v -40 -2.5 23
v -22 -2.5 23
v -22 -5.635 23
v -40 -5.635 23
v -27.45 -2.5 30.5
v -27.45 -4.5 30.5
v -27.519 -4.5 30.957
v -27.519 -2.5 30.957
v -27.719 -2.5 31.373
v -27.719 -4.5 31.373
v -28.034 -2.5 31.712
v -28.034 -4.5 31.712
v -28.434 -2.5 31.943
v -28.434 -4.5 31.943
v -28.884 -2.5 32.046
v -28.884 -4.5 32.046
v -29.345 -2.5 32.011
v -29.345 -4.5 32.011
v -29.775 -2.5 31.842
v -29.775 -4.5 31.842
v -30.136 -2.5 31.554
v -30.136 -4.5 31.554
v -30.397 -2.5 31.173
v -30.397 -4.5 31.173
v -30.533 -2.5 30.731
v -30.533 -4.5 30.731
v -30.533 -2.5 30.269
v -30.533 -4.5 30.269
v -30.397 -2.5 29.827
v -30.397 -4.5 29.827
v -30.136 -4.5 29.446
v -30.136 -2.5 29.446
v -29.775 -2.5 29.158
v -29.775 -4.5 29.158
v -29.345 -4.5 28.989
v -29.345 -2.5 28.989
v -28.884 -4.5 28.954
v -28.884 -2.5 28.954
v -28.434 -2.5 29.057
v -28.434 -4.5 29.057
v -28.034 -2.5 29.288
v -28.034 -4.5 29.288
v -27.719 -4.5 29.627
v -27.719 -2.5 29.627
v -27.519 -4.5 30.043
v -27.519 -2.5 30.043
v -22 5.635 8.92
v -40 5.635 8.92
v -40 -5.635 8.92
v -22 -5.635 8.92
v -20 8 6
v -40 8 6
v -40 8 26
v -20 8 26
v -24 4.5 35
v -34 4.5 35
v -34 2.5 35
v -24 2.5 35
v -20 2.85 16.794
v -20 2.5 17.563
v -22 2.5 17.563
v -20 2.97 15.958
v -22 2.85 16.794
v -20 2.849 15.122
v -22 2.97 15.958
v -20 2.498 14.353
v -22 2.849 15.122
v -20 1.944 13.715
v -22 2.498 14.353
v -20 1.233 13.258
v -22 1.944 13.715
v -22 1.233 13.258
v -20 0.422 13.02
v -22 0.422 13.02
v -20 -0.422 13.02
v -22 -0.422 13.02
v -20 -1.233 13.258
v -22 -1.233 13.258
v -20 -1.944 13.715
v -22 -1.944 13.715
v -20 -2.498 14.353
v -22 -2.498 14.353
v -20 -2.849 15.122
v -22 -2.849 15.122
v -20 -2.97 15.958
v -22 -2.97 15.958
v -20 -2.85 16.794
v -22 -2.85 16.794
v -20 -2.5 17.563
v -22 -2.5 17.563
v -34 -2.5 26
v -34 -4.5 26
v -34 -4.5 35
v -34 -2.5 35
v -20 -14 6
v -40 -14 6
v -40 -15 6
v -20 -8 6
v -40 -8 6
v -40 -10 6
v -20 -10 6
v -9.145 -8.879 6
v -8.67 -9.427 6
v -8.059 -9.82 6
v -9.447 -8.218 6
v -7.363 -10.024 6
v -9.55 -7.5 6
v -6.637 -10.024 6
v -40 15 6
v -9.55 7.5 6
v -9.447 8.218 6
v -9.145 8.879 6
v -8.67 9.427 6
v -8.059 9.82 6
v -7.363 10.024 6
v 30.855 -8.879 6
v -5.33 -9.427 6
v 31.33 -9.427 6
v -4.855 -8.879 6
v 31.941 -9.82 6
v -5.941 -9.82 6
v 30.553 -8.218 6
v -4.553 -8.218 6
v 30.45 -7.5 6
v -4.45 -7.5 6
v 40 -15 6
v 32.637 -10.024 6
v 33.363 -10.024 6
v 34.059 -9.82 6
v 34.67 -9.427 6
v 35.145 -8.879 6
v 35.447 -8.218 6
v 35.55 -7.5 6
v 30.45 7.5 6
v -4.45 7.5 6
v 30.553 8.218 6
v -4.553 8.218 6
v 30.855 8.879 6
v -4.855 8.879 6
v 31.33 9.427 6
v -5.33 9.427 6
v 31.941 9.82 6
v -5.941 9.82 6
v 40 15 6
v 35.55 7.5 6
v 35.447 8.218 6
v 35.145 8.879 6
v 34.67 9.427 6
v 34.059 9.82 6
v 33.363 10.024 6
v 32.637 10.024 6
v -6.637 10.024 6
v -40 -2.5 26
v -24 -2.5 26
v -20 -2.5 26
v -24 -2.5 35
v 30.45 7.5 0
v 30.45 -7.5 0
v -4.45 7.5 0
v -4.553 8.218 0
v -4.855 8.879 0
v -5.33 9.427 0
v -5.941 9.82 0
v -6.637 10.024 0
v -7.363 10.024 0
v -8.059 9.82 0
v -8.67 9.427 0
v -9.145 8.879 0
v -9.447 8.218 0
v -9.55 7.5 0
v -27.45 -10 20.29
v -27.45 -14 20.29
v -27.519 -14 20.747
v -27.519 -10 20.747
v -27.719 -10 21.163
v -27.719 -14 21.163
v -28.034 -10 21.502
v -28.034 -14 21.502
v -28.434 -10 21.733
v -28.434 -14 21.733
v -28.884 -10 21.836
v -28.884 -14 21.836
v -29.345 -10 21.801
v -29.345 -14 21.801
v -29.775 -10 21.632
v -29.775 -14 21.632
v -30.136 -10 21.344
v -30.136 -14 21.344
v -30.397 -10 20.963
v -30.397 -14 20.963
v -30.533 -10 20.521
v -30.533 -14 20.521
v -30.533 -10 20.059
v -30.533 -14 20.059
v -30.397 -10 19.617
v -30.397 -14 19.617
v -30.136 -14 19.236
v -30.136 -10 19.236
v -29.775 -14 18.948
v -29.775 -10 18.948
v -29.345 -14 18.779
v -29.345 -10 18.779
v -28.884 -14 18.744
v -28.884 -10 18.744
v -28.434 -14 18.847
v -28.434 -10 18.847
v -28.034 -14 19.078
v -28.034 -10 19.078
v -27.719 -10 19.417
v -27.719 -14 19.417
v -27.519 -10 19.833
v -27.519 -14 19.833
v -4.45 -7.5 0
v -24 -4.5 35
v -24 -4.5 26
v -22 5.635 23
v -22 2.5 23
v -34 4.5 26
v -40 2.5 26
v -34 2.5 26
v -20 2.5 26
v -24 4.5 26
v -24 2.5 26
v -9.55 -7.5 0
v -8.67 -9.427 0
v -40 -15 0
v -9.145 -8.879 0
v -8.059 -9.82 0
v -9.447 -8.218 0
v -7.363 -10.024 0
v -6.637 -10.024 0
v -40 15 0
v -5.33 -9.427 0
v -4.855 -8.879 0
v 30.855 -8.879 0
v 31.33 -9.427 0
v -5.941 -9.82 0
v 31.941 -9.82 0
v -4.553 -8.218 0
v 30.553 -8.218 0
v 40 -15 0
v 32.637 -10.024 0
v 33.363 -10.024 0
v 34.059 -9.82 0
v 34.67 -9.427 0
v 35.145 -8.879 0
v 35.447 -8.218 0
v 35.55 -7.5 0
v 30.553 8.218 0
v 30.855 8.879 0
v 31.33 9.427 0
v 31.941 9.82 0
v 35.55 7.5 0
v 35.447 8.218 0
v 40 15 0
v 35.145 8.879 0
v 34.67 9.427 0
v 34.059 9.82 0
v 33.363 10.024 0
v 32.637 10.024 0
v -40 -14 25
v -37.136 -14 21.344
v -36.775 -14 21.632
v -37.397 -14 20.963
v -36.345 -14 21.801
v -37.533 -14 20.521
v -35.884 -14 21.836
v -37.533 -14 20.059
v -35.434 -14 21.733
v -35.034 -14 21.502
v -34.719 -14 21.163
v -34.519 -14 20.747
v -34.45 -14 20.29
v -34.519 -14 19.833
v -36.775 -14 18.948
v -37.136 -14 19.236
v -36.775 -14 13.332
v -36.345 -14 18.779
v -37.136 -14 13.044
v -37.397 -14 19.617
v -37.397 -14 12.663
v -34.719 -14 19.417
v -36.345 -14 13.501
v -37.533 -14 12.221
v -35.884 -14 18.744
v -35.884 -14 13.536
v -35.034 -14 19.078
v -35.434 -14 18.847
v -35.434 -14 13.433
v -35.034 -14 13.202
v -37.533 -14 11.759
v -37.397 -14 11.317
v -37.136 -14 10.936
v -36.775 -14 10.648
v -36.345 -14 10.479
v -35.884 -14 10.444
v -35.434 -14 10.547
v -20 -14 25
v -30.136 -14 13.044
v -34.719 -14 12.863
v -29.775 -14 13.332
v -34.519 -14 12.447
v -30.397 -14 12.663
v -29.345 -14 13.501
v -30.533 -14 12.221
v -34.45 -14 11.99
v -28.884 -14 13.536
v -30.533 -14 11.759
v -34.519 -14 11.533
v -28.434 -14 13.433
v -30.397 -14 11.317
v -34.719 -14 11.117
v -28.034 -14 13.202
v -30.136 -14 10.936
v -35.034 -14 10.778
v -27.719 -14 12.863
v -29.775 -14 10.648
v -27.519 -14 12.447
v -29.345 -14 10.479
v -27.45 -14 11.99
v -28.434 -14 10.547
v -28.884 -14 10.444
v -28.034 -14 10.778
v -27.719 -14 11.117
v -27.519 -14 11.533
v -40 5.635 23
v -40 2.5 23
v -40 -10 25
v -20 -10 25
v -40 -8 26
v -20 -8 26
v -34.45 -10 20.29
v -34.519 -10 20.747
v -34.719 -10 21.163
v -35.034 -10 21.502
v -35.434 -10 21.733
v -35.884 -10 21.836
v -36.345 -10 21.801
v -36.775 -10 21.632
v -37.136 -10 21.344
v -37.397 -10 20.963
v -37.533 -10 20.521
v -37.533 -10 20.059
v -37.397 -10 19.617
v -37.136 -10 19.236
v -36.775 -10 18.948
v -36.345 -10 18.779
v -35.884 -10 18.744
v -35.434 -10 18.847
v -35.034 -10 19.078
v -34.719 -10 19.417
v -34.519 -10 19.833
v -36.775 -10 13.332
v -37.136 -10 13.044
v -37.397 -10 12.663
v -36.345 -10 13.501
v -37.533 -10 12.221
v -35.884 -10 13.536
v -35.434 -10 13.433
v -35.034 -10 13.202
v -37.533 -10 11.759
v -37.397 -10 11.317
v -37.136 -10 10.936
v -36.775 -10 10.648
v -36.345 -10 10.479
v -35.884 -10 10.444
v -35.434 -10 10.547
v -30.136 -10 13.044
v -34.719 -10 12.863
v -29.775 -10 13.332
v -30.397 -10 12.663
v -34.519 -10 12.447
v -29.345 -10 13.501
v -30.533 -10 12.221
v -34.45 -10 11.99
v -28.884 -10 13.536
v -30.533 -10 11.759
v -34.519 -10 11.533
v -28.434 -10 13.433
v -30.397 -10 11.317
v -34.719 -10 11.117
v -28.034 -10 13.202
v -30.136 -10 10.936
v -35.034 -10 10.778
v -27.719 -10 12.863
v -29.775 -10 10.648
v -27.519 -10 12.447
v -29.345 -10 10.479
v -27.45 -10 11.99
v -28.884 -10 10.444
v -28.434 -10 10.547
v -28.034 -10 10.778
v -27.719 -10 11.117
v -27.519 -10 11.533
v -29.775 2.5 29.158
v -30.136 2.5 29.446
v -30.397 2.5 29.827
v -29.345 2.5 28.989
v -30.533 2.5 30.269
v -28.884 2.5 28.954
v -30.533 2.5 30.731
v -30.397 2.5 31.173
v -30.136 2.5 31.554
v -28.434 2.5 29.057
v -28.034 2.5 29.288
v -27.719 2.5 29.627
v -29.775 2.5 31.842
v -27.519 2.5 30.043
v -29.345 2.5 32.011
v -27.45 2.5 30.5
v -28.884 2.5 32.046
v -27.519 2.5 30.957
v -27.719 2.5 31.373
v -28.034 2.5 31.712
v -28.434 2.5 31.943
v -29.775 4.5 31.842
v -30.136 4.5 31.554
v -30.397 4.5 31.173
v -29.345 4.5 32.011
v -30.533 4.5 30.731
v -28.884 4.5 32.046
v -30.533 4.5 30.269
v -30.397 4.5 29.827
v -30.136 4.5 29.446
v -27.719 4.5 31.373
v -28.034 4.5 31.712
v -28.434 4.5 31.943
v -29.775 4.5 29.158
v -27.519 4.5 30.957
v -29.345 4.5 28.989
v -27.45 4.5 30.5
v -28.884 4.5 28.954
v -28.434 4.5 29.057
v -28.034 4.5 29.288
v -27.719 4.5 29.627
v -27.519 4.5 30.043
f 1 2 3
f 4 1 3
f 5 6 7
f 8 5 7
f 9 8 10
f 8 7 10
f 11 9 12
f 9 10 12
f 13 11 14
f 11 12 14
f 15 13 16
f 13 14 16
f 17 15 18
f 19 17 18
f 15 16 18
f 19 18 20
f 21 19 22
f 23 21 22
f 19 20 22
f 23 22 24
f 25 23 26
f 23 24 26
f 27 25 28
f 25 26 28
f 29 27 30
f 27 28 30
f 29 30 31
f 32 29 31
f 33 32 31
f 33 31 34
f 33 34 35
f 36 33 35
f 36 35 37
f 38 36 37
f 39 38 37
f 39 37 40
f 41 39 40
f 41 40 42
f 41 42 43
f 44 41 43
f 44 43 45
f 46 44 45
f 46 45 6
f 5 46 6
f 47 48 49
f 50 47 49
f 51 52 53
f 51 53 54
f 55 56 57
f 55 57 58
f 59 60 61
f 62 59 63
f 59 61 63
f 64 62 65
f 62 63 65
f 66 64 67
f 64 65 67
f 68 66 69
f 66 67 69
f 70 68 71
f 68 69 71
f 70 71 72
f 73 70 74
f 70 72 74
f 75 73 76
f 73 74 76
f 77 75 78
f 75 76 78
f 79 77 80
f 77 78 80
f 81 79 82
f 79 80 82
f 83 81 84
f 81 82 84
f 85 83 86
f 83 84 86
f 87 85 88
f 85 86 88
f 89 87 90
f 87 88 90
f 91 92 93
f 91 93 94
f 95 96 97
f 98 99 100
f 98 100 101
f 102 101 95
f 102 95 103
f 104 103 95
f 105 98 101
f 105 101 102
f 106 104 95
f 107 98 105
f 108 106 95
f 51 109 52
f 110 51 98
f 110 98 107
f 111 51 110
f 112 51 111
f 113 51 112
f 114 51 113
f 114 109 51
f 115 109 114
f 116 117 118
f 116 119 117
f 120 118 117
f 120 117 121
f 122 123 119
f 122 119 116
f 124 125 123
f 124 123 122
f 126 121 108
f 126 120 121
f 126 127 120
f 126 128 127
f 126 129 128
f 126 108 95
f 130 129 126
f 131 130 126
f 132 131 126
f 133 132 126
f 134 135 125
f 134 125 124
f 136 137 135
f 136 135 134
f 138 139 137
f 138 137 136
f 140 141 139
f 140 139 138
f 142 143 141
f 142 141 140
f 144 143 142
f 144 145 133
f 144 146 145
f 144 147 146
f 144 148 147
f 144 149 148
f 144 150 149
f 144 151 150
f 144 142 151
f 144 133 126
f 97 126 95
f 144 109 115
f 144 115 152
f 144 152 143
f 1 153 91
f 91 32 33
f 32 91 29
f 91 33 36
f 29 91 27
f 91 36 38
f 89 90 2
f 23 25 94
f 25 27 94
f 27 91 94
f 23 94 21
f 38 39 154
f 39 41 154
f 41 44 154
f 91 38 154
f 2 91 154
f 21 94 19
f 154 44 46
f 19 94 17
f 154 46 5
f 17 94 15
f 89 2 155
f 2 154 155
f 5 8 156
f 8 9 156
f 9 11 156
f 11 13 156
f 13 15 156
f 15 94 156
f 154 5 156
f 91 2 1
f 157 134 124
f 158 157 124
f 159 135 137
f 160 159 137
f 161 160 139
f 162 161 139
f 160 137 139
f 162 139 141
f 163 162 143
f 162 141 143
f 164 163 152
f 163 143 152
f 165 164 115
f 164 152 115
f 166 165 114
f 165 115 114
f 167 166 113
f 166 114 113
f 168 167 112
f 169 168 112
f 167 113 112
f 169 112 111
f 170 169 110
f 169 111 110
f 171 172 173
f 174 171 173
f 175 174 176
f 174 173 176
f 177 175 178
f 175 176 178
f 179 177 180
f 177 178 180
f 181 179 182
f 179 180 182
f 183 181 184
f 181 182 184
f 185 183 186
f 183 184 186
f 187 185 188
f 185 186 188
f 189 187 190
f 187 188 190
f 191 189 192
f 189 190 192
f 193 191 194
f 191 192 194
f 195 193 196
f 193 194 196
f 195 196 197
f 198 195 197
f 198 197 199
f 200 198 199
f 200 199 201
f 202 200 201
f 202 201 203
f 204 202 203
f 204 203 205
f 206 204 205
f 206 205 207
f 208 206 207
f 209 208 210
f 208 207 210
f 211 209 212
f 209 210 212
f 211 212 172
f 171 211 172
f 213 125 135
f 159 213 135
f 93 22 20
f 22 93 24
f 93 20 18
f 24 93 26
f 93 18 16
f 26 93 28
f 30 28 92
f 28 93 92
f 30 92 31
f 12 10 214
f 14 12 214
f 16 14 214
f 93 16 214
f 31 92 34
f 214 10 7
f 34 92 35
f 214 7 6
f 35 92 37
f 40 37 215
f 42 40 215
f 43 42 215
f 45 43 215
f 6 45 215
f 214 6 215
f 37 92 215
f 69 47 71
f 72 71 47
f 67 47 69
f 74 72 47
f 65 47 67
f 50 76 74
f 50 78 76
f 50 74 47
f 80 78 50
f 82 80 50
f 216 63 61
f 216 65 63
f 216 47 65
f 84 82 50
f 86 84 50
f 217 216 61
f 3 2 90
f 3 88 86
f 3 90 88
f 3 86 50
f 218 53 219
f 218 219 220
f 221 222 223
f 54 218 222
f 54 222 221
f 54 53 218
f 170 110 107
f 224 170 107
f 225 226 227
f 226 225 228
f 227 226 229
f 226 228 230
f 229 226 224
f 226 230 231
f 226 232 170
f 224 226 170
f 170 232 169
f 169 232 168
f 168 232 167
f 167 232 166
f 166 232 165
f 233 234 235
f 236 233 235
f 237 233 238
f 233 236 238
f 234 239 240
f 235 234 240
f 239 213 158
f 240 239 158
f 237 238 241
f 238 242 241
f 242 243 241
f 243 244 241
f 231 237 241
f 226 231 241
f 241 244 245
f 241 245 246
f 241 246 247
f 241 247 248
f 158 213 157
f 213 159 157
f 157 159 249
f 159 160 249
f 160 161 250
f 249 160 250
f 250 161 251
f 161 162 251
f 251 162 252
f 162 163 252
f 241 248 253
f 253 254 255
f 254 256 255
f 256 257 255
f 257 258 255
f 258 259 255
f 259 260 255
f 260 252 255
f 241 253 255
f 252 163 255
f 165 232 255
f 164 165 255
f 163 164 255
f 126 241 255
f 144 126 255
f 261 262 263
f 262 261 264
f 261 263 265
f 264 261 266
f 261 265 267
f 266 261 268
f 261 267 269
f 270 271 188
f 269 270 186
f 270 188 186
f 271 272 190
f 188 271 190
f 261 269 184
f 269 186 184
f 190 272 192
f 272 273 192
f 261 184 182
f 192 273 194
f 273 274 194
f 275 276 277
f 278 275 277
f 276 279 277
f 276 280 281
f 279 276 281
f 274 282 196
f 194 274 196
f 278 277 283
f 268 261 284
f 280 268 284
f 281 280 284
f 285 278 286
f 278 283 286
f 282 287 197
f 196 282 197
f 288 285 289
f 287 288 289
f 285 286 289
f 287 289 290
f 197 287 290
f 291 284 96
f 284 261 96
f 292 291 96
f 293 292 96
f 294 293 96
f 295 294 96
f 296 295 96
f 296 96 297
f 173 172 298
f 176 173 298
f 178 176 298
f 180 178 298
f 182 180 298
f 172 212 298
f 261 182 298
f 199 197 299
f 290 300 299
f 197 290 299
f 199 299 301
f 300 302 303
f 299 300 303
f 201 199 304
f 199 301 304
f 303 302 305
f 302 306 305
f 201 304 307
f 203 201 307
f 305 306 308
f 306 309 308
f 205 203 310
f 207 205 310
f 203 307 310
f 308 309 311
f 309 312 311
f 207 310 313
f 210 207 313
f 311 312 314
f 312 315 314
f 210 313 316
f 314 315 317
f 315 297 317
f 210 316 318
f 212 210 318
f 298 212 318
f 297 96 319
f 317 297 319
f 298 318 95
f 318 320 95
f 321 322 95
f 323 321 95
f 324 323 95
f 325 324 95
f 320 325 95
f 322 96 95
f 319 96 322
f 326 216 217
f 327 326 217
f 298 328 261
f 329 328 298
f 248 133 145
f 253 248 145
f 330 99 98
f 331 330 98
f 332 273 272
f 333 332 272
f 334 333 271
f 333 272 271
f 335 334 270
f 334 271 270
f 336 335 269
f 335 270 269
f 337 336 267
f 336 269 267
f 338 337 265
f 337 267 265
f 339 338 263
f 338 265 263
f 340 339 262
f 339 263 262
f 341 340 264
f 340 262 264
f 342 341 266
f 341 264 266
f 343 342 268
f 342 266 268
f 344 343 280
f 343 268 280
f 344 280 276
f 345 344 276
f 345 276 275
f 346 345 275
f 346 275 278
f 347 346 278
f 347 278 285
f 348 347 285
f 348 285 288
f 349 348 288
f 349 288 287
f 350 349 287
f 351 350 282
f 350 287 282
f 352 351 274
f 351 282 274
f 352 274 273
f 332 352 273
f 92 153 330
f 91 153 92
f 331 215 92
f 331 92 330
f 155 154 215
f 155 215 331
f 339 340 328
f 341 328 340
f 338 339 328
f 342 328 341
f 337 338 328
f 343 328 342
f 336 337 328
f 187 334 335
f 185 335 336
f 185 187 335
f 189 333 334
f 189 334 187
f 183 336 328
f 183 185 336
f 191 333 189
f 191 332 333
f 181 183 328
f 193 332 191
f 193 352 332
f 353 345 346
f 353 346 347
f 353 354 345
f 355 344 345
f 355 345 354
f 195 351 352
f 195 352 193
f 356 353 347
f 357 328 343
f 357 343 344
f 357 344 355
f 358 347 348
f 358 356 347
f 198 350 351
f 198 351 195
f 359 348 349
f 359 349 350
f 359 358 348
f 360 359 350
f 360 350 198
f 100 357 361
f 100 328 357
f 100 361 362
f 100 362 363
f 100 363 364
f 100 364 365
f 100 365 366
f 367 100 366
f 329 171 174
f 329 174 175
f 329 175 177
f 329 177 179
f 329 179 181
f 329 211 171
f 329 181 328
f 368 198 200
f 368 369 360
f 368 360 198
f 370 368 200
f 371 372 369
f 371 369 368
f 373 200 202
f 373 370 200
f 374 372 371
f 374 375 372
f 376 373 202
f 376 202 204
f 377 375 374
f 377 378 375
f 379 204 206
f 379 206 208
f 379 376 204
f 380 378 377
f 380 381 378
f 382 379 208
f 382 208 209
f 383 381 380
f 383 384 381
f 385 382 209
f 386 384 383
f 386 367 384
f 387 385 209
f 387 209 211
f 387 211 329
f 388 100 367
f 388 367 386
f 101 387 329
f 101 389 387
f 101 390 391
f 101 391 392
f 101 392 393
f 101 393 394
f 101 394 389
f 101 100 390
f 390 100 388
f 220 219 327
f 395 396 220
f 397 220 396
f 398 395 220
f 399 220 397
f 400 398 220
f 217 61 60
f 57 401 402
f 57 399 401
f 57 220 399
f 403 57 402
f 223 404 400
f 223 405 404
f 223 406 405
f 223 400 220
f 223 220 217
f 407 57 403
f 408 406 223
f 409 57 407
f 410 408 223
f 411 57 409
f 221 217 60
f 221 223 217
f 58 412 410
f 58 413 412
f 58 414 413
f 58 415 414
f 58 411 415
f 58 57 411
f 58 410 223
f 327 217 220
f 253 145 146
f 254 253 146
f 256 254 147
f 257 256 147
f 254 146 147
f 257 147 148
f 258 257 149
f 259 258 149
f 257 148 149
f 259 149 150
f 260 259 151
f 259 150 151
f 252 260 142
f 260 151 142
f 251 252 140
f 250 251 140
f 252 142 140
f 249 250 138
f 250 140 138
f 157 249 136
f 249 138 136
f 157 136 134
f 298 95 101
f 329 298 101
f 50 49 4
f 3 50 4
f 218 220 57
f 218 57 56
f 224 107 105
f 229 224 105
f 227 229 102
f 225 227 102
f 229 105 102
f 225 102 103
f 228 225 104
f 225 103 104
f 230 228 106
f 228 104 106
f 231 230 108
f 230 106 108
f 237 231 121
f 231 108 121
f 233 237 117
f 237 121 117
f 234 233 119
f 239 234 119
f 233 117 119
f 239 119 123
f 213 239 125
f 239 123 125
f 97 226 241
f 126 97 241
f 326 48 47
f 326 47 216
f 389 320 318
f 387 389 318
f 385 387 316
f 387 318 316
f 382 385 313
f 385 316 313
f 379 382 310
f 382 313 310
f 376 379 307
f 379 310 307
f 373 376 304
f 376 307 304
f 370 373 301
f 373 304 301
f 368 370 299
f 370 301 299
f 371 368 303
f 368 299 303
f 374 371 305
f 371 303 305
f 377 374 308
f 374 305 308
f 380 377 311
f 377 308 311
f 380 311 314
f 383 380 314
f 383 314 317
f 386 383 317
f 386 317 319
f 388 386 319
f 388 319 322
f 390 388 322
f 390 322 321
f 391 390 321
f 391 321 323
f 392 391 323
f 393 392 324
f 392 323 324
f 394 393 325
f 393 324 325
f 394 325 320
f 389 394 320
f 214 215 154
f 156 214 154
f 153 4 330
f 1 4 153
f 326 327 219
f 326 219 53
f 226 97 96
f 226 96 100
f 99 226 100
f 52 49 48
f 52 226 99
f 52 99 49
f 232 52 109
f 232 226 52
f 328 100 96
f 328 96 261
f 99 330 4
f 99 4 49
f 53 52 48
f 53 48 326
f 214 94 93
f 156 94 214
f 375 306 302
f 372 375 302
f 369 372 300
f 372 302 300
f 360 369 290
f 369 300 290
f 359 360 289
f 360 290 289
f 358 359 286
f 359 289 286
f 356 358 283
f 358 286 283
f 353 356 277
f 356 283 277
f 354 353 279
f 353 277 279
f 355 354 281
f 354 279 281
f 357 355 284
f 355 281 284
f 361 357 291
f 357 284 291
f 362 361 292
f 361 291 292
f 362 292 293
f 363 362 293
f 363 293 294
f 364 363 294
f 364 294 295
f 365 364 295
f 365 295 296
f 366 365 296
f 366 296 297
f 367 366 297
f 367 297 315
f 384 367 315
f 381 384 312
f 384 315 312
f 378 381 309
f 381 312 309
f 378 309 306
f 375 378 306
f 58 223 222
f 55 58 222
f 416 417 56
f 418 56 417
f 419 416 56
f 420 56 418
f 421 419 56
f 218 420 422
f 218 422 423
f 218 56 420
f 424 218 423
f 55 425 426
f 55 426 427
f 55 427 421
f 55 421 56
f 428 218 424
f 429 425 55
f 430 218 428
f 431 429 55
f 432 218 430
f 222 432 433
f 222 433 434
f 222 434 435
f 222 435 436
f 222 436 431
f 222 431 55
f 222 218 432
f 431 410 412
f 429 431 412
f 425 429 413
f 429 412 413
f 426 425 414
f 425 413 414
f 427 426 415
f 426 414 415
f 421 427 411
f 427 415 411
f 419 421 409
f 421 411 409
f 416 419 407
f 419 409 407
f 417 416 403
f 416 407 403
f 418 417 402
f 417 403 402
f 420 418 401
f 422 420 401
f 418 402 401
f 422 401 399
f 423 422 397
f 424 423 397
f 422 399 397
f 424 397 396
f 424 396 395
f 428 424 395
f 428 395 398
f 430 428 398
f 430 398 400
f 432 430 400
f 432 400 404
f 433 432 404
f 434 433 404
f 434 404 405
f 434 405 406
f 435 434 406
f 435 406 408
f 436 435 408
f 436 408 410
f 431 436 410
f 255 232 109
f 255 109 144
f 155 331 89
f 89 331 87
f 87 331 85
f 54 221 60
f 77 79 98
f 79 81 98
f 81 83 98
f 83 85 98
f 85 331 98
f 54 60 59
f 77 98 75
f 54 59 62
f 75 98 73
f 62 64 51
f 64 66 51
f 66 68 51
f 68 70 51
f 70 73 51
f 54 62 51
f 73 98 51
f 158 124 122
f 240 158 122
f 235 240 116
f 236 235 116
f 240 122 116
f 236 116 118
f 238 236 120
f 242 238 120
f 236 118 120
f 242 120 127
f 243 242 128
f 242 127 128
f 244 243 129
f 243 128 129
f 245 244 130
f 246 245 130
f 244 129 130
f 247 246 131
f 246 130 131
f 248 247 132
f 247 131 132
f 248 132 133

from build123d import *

# Parameters (mm, degrees)
F0_W      = 80
F0_H      = 30
F1_DEPTH  = 6
F3_DEPTH  = 6.001
F4_W      = 20
F4_H      = 16
F5_DEPTH  = 20
F6_W      = 11.27
F6_H      = 14.08
F7_DEPTH  = 18
F8_R      = 2.97
F9_DEPTH  = 62.001
F10_W     = 10
F10_H     = 9
F11_DEPTH = 9
F12_R     = 1.55
F13_DEPTH = 19.501
F14_W     = 20
F14_H     = 5
F15_DEPTH = 19
F16_W     = 20
F16_H     = 4
F17_DEPTH = 25
F18_R     = 1.55
F19_DEPTH = 4


with BuildPart() as f1:
    # F0 (on Top) → F1 (new body)
    with BuildSketch(Plane.XY):
        Rectangle(F0_W, F0_H)
    extrude(amount=F1_DEPTH)

    # F2 (on face) → F3 (cut, through all)
    with BuildSketch(Plane.XY.offset(6)):
        with BuildLine():
            Line((35.55, -7.5), (35.55, 7.5))
            ThreePointArc((35.55, 7.5), (33, 10.05), (30.45, 7.5))
            Line((30.45, 7.5), (30.45, -7.5))
            ThreePointArc((30.45, -7.5), (33, -10.05), (35.55, -7.5))
        make_face()
        with BuildLine():
            Line((-4.45, -7.5), (-4.45, 7.5))
            ThreePointArc((-4.45, 7.5), (-7, 10.05), (-9.55, 7.5))
            Line((-9.55, 7.5), (-9.55, -7.5))
            ThreePointArc((-9.55, -7.5), (-7, -10.05), (-4.45, -7.5))
        make_face()
    extrude(amount=-F3_DEPTH, mode=Mode.SUBTRACT)

    # F4 (on face) → F5 (join)
    with BuildSketch(Plane.XY.offset(6)):
        with Locations((-30, 0)):
            Rectangle(F4_W, F4_H)
    extrude(amount=F5_DEPTH)

    # F6 (on face) → F7 (cut)
    with BuildSketch(Plane(origin=(-40, 0, 0), x_dir=(0, -1, 0), z_dir=(-1, 0, 0))):
        with Locations((0, 15.96)):
            Rectangle(F6_W, F6_H)
    extrude(amount=-F7_DEPTH, mode=Mode.SUBTRACT)

    # F8 (on face) → F9 (cut, through all)
    with BuildSketch(Plane(origin=(-22, 0, 0), x_dir=(0, -1, 0), z_dir=(-1, 0, 0))):
        with Locations((0, 15.96)):
            Circle(F8_R)
    extrude(amount=-F9_DEPTH, mode=Mode.SUBTRACT)

    # F10 (on face) → F11 (join)
    with BuildSketch(Plane.XY.offset(26)):
        with Locations((-29, 0)):
            Rectangle(F10_W, F10_H)
    extrude(amount=F11_DEPTH)

    # F12 (on face) → F13 (cut, through all)
    with BuildSketch(Plane.XZ.offset(4.5)):
        with Locations((-29, 30.5)):
            Circle(F12_R)
    extrude(amount=-F13_DEPTH, mode=Mode.SUBTRACT)

    # F14 (on face) → F15 (cut)
    with BuildSketch(Plane.XY.offset(35)):
        with Locations((-30, 0)):
            Rectangle(F14_W, F14_H)
    extrude(amount=-F15_DEPTH, mode=Mode.SUBTRACT)

    # F16 (on Top) → F17 (join)
    with BuildSketch(Plane.XY):
        with Locations((-30, -12)):
            Rectangle(F16_W, F16_H)
    extrude(amount=F17_DEPTH)

    # F18 (on face) → F19 (cut)
    with BuildSketch(Plane.XZ.offset(14)):
        with Locations((-36, 20.29)):
            Circle(F18_R)
        with Locations((-36, 11.99)):
            Circle(F18_R)
        with Locations((-29, 20.29)):
            Circle(F18_R)
        with Locations((-29, 11.99)):
            Circle(F18_R)
    extrude(amount=-F19_DEPTH, mode=Mode.SUBTRACT)


solid = f1.part
